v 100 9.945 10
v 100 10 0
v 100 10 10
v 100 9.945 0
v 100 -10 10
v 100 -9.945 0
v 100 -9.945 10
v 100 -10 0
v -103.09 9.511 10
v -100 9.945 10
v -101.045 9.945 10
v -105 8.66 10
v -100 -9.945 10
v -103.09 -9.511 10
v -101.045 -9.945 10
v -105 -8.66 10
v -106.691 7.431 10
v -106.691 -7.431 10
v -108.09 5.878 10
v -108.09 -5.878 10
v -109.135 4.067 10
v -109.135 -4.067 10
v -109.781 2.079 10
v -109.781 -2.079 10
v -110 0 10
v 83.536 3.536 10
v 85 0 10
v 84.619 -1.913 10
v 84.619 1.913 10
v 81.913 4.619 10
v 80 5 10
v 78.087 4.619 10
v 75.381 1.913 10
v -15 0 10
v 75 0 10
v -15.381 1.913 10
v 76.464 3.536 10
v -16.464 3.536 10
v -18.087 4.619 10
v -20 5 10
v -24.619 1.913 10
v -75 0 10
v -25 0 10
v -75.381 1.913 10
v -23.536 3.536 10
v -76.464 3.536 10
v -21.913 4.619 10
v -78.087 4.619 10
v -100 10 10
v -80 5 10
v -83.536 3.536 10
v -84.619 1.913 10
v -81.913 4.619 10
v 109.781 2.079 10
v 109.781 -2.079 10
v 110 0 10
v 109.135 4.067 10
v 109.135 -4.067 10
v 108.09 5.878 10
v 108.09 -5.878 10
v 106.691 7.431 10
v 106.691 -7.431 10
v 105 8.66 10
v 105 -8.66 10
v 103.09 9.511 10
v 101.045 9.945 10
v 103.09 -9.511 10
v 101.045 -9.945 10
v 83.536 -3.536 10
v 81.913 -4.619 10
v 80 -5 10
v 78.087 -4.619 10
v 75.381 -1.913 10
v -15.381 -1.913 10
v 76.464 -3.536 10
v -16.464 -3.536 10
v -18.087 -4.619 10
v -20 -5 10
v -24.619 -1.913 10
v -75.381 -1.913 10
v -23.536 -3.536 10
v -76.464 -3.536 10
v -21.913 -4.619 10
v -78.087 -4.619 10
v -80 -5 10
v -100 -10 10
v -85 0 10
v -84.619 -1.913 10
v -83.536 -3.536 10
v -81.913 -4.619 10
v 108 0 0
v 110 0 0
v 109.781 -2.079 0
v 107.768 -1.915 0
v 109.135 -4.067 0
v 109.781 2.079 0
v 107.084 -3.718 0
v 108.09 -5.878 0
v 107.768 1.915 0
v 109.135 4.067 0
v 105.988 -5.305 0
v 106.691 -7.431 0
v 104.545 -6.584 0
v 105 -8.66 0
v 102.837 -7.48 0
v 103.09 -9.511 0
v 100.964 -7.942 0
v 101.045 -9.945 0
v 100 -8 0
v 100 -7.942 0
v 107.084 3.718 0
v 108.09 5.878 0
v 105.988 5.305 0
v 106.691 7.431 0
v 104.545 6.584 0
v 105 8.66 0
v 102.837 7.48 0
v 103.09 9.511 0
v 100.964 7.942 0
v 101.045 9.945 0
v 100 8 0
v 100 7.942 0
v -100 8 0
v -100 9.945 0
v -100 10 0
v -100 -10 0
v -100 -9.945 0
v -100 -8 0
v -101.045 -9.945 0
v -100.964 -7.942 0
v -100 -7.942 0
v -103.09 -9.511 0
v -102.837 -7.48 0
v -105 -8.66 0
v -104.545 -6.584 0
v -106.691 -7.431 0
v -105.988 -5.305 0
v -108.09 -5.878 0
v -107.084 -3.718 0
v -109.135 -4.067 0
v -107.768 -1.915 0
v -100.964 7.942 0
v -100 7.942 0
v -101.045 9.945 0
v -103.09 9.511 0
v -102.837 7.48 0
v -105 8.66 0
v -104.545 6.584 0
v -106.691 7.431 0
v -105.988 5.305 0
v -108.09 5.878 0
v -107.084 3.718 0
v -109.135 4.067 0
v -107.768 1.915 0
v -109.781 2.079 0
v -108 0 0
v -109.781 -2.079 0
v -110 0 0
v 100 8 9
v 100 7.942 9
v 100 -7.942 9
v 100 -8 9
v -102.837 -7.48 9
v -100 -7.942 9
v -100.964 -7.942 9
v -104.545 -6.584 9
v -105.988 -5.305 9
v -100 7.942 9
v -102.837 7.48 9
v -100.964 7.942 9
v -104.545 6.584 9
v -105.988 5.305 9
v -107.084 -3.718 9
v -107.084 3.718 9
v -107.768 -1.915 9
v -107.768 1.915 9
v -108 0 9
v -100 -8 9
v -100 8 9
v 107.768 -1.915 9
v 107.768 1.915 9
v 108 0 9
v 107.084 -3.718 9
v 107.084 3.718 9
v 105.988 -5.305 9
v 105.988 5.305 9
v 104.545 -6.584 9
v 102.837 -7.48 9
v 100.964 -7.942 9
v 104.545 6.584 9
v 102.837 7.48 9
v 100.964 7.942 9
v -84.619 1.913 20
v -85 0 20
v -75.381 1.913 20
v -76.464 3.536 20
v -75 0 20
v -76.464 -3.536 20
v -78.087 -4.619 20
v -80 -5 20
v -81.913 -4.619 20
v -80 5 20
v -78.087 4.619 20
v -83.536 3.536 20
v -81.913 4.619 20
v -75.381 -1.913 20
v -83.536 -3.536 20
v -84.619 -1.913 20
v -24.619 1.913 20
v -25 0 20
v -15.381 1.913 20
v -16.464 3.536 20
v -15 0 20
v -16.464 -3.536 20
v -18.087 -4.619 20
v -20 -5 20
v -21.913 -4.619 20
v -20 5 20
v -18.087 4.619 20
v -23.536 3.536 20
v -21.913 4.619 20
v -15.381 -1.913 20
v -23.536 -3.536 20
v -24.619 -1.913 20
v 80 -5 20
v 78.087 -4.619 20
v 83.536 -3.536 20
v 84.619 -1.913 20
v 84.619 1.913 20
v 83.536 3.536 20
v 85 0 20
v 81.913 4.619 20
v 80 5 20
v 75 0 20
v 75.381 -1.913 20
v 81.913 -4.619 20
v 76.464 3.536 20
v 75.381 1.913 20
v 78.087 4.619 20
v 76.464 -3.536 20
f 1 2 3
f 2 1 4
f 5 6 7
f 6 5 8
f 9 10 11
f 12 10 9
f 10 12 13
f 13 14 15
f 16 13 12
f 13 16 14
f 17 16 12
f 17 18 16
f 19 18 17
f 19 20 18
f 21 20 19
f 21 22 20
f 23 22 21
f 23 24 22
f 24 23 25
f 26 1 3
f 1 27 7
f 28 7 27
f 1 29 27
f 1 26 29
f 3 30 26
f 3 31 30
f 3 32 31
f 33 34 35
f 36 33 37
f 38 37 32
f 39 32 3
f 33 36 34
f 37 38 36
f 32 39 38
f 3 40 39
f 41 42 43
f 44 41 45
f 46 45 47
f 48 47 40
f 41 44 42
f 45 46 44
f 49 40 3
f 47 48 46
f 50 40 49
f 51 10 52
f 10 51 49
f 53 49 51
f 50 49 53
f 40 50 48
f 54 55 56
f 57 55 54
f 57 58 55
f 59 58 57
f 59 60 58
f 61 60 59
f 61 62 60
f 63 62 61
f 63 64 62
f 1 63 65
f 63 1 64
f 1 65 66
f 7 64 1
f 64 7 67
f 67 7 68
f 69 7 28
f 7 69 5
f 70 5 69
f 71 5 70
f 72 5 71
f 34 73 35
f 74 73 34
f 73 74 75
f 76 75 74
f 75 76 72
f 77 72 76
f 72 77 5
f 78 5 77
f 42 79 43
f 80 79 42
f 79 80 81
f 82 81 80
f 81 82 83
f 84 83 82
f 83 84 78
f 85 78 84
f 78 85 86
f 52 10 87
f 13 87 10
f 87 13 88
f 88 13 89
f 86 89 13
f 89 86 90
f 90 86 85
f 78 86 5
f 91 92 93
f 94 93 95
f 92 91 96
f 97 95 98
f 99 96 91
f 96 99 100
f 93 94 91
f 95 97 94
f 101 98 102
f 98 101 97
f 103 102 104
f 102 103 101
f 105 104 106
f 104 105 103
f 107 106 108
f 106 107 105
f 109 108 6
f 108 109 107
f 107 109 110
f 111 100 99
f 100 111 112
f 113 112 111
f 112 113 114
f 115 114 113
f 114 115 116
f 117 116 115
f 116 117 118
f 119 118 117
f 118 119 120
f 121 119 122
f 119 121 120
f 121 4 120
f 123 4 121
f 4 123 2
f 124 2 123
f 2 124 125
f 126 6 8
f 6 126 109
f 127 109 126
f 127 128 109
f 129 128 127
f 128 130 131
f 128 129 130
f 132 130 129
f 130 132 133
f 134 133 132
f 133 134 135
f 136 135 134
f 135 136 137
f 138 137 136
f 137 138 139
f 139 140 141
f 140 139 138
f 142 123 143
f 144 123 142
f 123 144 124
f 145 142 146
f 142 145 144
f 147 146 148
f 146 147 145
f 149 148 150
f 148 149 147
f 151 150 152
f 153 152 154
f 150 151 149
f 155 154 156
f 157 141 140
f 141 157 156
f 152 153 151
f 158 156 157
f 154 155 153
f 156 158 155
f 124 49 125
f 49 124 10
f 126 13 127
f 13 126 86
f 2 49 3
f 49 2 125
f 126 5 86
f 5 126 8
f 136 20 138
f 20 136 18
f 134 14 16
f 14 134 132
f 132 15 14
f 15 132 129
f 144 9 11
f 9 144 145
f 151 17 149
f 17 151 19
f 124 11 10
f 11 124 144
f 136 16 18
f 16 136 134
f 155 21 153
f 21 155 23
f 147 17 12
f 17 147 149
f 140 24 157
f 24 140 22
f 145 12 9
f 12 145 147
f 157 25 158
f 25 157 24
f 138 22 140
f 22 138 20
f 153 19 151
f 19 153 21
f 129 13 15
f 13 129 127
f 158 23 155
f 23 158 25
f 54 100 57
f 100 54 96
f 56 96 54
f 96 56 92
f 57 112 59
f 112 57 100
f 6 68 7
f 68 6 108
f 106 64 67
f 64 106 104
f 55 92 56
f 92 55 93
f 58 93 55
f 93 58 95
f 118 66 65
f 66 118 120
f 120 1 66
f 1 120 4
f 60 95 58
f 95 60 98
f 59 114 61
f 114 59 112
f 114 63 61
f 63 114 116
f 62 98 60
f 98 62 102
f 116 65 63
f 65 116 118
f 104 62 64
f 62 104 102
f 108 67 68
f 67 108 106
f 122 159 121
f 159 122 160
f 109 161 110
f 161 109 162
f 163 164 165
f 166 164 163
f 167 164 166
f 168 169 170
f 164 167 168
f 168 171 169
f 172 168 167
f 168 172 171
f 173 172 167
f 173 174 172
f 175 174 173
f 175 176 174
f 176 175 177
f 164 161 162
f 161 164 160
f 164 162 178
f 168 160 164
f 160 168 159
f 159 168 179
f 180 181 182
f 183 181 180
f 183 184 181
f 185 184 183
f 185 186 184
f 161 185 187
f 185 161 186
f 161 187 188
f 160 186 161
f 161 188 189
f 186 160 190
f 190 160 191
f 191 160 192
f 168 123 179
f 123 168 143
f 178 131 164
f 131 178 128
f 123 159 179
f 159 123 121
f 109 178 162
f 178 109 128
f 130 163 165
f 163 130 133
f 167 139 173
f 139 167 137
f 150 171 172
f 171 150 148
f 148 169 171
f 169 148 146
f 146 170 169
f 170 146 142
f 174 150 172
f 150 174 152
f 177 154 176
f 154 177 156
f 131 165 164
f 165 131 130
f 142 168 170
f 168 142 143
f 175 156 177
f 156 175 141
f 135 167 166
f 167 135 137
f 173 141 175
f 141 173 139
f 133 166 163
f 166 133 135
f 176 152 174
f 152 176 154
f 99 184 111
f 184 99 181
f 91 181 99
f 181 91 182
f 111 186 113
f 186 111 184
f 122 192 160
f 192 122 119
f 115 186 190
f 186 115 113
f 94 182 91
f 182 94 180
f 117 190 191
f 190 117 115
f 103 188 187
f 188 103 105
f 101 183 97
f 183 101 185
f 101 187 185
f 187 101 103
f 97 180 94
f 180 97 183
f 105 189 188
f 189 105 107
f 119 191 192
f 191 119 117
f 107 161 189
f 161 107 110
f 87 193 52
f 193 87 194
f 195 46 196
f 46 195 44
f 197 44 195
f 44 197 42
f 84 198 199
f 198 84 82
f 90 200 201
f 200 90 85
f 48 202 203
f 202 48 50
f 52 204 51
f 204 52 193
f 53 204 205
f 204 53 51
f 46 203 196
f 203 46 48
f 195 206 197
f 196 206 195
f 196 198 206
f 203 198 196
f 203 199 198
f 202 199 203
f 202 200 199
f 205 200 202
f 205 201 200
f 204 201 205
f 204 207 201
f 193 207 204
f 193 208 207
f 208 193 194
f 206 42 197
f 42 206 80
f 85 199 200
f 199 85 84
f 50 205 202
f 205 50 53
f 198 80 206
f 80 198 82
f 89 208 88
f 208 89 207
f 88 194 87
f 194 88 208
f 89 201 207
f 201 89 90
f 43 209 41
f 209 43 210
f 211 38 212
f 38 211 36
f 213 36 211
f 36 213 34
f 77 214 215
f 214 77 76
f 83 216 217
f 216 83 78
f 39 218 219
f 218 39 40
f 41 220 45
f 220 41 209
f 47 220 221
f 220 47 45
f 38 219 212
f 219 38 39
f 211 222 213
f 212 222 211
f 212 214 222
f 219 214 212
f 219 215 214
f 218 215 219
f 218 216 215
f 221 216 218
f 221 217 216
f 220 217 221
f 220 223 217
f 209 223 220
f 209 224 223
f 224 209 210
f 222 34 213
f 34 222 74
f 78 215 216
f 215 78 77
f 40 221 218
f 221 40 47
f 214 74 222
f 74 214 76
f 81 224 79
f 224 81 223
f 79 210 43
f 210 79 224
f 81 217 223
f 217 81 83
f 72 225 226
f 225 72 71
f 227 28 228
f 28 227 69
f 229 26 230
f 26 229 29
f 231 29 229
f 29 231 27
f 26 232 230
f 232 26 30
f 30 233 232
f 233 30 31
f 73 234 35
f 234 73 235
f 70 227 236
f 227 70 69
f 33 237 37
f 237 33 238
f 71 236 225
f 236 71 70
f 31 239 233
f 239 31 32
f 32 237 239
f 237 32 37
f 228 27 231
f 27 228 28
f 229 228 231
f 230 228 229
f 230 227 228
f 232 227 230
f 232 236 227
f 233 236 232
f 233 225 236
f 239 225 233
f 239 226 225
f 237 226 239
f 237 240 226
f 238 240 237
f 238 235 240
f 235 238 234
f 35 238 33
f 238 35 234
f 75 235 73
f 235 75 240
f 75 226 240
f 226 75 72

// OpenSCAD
module end_cap(x, height, radius) {
	translate([x, 0]) cylinder(h=height, r=radius);
}

module rounded_rectangle(length, width, height) {
	radius = width / 2;
	cuboid_length = length - 2 * radius;
	x = cuboid_length / 2;
	translate([-x, -radius, 0])
		cube([cuboid_length, width, height]);
	end_cap(-x, height, radius);
	end_cap(x, height, radius);
}

module peg(x) {
	translate([x, 0, 10]) cylinder(h=10, r=5);
}

difference() {
	rounded_rectangle(220, 20, 10);
	rounded_rectangle(216, 16, 9);
}
peg(-80);
peg(-20);
peg(80);
